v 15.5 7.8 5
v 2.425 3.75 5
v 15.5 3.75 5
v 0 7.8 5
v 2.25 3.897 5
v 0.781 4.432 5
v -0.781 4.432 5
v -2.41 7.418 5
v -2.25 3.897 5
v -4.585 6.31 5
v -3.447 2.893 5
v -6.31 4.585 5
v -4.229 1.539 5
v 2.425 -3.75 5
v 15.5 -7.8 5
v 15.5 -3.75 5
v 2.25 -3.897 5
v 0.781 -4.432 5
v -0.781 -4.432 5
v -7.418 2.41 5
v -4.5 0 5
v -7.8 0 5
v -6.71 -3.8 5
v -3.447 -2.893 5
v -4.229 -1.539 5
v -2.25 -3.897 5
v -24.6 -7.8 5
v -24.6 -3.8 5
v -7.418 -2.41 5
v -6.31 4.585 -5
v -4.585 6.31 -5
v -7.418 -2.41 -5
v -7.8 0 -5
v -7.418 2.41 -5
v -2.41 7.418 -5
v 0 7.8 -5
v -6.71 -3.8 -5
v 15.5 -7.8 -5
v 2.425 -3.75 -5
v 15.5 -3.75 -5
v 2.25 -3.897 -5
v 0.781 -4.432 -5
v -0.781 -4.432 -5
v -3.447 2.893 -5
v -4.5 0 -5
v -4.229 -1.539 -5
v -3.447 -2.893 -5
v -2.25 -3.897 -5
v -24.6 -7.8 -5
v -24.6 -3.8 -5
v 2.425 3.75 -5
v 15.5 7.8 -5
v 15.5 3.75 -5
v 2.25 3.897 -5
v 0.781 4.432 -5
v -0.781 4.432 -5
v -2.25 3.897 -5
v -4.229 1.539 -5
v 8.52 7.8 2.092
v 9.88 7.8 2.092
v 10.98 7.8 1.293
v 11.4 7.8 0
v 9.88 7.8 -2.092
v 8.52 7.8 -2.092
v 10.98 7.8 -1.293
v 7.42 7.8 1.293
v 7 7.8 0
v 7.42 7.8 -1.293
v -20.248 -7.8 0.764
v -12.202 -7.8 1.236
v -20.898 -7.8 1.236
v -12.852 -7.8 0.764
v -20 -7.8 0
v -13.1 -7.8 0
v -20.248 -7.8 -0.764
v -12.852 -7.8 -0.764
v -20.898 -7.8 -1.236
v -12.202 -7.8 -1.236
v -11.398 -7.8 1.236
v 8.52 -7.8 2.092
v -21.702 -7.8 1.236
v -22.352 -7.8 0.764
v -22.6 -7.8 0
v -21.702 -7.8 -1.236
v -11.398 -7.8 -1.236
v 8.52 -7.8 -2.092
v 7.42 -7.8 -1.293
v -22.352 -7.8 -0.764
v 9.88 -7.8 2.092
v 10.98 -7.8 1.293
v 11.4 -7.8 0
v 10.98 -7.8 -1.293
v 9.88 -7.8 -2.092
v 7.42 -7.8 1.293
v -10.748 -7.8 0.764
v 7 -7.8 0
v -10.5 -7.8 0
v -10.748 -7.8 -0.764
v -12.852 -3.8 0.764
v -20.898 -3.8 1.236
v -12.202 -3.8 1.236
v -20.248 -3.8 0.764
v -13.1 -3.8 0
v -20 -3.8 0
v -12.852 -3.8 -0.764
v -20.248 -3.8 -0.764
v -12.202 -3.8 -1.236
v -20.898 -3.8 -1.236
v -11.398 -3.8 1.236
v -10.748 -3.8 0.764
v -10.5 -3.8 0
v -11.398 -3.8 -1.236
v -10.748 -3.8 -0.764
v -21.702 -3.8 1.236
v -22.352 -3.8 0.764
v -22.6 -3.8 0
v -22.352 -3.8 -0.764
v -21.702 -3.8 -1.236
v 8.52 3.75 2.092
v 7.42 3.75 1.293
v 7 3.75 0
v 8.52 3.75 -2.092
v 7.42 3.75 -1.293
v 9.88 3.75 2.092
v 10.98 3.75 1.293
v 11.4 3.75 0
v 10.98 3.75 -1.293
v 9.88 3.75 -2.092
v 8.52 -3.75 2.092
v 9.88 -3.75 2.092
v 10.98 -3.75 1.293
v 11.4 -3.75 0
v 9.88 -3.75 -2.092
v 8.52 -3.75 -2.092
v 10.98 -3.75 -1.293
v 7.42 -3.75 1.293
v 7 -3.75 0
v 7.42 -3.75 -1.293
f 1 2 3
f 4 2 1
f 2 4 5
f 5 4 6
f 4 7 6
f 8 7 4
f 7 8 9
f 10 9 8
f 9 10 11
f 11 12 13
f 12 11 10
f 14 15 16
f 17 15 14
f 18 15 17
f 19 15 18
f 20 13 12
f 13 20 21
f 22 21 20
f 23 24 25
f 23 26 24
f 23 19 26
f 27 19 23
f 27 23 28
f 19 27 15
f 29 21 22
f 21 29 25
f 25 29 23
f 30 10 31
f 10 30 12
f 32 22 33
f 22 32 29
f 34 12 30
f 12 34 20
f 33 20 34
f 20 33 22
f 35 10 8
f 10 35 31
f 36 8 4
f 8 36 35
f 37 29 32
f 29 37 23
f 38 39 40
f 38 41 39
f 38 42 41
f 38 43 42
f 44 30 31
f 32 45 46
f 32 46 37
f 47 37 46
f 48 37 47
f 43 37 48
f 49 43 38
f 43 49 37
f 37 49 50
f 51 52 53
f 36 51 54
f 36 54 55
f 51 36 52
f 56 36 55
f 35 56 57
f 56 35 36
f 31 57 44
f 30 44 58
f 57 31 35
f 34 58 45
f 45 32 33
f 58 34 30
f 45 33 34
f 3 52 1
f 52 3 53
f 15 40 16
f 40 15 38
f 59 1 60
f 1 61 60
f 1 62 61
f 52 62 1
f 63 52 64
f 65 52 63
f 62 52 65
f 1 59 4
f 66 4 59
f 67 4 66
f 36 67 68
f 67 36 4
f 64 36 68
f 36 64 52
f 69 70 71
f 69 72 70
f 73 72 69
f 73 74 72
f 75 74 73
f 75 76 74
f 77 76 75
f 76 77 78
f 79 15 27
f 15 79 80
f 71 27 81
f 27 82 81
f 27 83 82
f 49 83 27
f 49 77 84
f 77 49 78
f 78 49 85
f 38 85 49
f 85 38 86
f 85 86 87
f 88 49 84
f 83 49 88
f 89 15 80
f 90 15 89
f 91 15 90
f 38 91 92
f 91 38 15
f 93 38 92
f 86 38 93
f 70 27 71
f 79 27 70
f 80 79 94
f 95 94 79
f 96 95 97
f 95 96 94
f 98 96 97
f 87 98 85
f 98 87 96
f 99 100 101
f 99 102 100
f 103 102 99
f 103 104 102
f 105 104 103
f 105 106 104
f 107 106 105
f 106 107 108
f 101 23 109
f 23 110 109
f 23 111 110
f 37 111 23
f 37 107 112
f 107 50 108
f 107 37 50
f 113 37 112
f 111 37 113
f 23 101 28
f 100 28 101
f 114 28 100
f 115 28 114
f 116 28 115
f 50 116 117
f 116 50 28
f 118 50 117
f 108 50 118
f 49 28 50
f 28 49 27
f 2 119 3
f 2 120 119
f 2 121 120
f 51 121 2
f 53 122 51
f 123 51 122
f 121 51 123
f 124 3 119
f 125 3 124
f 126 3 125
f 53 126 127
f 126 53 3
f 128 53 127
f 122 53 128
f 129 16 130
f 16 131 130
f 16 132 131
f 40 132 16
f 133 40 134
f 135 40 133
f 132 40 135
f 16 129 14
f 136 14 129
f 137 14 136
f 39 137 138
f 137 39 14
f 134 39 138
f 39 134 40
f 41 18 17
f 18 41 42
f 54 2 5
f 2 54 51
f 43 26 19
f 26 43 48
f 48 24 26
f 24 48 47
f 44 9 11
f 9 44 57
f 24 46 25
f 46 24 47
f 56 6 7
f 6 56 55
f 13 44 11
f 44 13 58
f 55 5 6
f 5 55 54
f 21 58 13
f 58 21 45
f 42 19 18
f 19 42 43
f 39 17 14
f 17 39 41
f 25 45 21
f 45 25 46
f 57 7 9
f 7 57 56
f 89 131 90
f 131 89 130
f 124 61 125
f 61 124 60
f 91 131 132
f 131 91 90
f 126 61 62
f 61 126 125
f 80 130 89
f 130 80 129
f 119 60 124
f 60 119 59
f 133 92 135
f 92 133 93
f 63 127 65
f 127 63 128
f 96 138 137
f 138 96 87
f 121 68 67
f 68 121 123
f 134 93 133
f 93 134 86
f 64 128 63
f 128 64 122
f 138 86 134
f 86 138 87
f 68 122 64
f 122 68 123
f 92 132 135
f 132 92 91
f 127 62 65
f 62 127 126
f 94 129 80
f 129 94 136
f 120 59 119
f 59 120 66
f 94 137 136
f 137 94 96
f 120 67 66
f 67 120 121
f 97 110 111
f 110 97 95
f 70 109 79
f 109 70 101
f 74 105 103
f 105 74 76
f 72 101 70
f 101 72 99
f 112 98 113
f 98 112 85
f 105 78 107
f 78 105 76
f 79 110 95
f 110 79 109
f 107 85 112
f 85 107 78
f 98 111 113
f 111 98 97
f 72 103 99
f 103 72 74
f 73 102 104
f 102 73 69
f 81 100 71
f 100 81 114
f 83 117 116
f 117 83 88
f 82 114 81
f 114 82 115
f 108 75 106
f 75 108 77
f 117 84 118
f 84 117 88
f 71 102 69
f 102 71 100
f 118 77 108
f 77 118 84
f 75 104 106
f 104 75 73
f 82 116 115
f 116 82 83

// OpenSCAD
// file: functions.scad
// PRUSA Mendel  
// Functions used in many files
// GNU GPL v3
// Josef Průša
// josefprusa@me.com
// prusadjs.cz
// http://www.reprap.org/wiki/Prusa_Mendel
// http://github.com/prusajr/PrusaMendel


module nut(d,h,horizontal=true){
cornerdiameter =  (d / 2) / cos (180 / 6);
cylinder(h = h, r = cornerdiameter, $fn = 6);
if(horizontal){
for(i = [1:6]){
	rotate([0,0,60*i]) translate([-cornerdiameter-0.2,0,0]) rotate([0,0,-45]) cube(size = [2,2,h]);
}}
}

// Based on nophead research
module polyhole(d,h) {
    n = max(round(2 * d),3);
    rotate([0,0,180])
        cylinder(h = h, r = (d / 2) / cos (180 / n), $fn = n);
}




module roundcorner(diameter){
	difference(){
		cube(size = [diameter,diameter,99], center = false);
		translate(v = [diameter, diameter, 0]) cylinder(h = 100, r=diameter, center=false,$fn = max(3*diameter,20));
	}
}
// file: configuration.scad
// PRUSA Mendel  
// Configuration file
// GNU GPL v2
// Josef Pra
// josefprusa@me.com
// prusadjs.cz
// http://www.reprap.org/wiki/Prusa_Mendel
// http://github.com/prusajr/PrusaMendel


// PLEASE SELECT ONE OF THE CONFIGURATIONS BELOW
// BY UN-COMMENTING IT


variant=0; //0 for metric
//variant=1; //1 for SAE
if(variant==0){
echo("variant: metric");
}else if(variant==1){
echo("variant: sae");
} else{
echo("WARNING: INVALID CONFIGURATION");
}




vars=[
//[m8_dia,m8_nut, m4_dia, m4_nut, m3_dia, m3_nut, bush_dia, mot_shaft, bush_rod, bush_outerdia, bush_length, m5_dia, m5_nut]
[9, 16.4, 5,9, 4.4, 7, 11, 5.3, 8, 16, 11, 5.6, 10],//metric
[9,15.7,5.5,10.6,5.5,10.6,11.5,5.3,7.9375,16,11,5.6, 10]//SAE
];


//BUSHING TYPE Can generate three versions
// 1 - regular old ones
// 2 - helical ones
// 3 - holders for brass or any other bought bushings
bushing_type = 2;


//Round corner diameter
round_corner_diameter = 8;


//Thin wall size
layer_height = 0.4;
perimeter_width_over_thicknes = 1.6;
infill_widht_over_thickness = 1.55;
thin_wall = 2*(perimeter_width_over_thicknes*layer_height+infill_widht_over_thickness*layer_height);
if(thin_wall<2){
	echo("Check thin wall size, its below 2mm!");
}
echo(thin_wall);


//DO NOT TOUCH THIS SECTION!
m8_diameter = vars[variant][0];
m8_nut_diameter = vars[variant][1];
m4_diameter = vars[variant][2];
m4_nut_diameter = vars[variant][3];
m3_diameter = vars[variant][4];
m3_nut_diameter = vars[variant][5];
bushing_diameter = vars[variant][6];
motor_shaft=vars[variant][7];
bushing_rodsize = vars[variant][8];
bushing_outerDiameter = vars[variant][9];
bushing_lenght = vars[variant][10];
m5_diameter = vars[variant][11];
m5_nut_diameter = vars[variant][12];



// MINI-HUXLEY VERSION (TODO, just place holder)
// include <configuration-huxley.scad>


// MEGA VERSION (TODO, just place holder)
// include <configuration-mega.scad>




// Some basic functions, probably should be somewhere else
module roundcorner(diameter){
	difference(){
		cube(size = [diameter,diameter,99], center = false);
		translate(v = [diameter, diameter, 0]) cylinder(h = 100, r=diameter, center=true);
	}
}

include <functions.scad>
// main file
// PRUSA Mendel  
// Endstop holder
// Used to attach endstops to 8mm rods
// GNU GPL v2
// Josef Průša
// josefprusa@me.com
// prusadjs.cz
// http://www.reprap.org/wiki/Prusa_Mendel
// http://github.com/prusajr/PrusaMendel

// Modified by Adrian to include support for sub-min microswitches and to make PCB mounts too. 15 May 2011

include <configuration.scad>

// Print four of the objects generated when pcb_mount is true, two of those generated
// when it is false and switch_add is 0, and one when it is false and switch_add is 11.

pcb_mount=false; // Set false for endstop
switch_add =0; // Set 0 for ordinary endstop, 11 for Z with adjuster

/**
 *@name Endstop holder
 *@using 1 m3x20
 *@using 1 m3nut
 *@using 2 m3washer
 */
module endstop(){
outer_diameter = m8_diameter/2+3.3;
screw_hole_spacing = 9.5; // Set to 20 to get standard design
opening_size = m8_diameter-1.5; //openingsize
switch_screw_hole_radius = 1.3; // Set to m3_diameter/2 to get standard design

translate([-outer_diameter, -outer_diameter, -5]) 
difference(){

	union(){


		translate([outer_diameter, outer_diameter, 0]) cylinder(h =10, r = outer_diameter, $fn = 20);
		translate([outer_diameter, 0, 0]) cube([15.5,outer_diameter*2,10]);
		if(!pcb_mount)
			translate([-42,0, 0]) cube([50, 4, 10]);
	}

	// Chop the end just after the hole

	translate([-(56+screw_hole_spacing+ switch_screw_hole_radius+switch_add), -10, -10]) 
		cube([50, 50, 50]);

	translate([9, outer_diameter-opening_size/2, 0]) cube([18,opening_size,20]);
	translate([outer_diameter, outer_diameter, 0]) cylinder(h =20, r = m8_diameter/2, $fn = 18);
	translate([17, 17, 5]) rotate([90, 0, 0]) cylinder(h =20, r = m3_diameter/2, $fn = 10);
	translate([-4-switch_add, 17, 5]) rotate([90, 0, 0]) cylinder(h =20, r = switch_screw_hole_radius, $fn = 10);
	translate([-(4+switch_add+screw_hole_spacing), 17, 5]) rotate([90, 0, 0]) cylinder(h =20, r = switch_screw_hole_radius, $fn = 10);
}
}
endstop();
